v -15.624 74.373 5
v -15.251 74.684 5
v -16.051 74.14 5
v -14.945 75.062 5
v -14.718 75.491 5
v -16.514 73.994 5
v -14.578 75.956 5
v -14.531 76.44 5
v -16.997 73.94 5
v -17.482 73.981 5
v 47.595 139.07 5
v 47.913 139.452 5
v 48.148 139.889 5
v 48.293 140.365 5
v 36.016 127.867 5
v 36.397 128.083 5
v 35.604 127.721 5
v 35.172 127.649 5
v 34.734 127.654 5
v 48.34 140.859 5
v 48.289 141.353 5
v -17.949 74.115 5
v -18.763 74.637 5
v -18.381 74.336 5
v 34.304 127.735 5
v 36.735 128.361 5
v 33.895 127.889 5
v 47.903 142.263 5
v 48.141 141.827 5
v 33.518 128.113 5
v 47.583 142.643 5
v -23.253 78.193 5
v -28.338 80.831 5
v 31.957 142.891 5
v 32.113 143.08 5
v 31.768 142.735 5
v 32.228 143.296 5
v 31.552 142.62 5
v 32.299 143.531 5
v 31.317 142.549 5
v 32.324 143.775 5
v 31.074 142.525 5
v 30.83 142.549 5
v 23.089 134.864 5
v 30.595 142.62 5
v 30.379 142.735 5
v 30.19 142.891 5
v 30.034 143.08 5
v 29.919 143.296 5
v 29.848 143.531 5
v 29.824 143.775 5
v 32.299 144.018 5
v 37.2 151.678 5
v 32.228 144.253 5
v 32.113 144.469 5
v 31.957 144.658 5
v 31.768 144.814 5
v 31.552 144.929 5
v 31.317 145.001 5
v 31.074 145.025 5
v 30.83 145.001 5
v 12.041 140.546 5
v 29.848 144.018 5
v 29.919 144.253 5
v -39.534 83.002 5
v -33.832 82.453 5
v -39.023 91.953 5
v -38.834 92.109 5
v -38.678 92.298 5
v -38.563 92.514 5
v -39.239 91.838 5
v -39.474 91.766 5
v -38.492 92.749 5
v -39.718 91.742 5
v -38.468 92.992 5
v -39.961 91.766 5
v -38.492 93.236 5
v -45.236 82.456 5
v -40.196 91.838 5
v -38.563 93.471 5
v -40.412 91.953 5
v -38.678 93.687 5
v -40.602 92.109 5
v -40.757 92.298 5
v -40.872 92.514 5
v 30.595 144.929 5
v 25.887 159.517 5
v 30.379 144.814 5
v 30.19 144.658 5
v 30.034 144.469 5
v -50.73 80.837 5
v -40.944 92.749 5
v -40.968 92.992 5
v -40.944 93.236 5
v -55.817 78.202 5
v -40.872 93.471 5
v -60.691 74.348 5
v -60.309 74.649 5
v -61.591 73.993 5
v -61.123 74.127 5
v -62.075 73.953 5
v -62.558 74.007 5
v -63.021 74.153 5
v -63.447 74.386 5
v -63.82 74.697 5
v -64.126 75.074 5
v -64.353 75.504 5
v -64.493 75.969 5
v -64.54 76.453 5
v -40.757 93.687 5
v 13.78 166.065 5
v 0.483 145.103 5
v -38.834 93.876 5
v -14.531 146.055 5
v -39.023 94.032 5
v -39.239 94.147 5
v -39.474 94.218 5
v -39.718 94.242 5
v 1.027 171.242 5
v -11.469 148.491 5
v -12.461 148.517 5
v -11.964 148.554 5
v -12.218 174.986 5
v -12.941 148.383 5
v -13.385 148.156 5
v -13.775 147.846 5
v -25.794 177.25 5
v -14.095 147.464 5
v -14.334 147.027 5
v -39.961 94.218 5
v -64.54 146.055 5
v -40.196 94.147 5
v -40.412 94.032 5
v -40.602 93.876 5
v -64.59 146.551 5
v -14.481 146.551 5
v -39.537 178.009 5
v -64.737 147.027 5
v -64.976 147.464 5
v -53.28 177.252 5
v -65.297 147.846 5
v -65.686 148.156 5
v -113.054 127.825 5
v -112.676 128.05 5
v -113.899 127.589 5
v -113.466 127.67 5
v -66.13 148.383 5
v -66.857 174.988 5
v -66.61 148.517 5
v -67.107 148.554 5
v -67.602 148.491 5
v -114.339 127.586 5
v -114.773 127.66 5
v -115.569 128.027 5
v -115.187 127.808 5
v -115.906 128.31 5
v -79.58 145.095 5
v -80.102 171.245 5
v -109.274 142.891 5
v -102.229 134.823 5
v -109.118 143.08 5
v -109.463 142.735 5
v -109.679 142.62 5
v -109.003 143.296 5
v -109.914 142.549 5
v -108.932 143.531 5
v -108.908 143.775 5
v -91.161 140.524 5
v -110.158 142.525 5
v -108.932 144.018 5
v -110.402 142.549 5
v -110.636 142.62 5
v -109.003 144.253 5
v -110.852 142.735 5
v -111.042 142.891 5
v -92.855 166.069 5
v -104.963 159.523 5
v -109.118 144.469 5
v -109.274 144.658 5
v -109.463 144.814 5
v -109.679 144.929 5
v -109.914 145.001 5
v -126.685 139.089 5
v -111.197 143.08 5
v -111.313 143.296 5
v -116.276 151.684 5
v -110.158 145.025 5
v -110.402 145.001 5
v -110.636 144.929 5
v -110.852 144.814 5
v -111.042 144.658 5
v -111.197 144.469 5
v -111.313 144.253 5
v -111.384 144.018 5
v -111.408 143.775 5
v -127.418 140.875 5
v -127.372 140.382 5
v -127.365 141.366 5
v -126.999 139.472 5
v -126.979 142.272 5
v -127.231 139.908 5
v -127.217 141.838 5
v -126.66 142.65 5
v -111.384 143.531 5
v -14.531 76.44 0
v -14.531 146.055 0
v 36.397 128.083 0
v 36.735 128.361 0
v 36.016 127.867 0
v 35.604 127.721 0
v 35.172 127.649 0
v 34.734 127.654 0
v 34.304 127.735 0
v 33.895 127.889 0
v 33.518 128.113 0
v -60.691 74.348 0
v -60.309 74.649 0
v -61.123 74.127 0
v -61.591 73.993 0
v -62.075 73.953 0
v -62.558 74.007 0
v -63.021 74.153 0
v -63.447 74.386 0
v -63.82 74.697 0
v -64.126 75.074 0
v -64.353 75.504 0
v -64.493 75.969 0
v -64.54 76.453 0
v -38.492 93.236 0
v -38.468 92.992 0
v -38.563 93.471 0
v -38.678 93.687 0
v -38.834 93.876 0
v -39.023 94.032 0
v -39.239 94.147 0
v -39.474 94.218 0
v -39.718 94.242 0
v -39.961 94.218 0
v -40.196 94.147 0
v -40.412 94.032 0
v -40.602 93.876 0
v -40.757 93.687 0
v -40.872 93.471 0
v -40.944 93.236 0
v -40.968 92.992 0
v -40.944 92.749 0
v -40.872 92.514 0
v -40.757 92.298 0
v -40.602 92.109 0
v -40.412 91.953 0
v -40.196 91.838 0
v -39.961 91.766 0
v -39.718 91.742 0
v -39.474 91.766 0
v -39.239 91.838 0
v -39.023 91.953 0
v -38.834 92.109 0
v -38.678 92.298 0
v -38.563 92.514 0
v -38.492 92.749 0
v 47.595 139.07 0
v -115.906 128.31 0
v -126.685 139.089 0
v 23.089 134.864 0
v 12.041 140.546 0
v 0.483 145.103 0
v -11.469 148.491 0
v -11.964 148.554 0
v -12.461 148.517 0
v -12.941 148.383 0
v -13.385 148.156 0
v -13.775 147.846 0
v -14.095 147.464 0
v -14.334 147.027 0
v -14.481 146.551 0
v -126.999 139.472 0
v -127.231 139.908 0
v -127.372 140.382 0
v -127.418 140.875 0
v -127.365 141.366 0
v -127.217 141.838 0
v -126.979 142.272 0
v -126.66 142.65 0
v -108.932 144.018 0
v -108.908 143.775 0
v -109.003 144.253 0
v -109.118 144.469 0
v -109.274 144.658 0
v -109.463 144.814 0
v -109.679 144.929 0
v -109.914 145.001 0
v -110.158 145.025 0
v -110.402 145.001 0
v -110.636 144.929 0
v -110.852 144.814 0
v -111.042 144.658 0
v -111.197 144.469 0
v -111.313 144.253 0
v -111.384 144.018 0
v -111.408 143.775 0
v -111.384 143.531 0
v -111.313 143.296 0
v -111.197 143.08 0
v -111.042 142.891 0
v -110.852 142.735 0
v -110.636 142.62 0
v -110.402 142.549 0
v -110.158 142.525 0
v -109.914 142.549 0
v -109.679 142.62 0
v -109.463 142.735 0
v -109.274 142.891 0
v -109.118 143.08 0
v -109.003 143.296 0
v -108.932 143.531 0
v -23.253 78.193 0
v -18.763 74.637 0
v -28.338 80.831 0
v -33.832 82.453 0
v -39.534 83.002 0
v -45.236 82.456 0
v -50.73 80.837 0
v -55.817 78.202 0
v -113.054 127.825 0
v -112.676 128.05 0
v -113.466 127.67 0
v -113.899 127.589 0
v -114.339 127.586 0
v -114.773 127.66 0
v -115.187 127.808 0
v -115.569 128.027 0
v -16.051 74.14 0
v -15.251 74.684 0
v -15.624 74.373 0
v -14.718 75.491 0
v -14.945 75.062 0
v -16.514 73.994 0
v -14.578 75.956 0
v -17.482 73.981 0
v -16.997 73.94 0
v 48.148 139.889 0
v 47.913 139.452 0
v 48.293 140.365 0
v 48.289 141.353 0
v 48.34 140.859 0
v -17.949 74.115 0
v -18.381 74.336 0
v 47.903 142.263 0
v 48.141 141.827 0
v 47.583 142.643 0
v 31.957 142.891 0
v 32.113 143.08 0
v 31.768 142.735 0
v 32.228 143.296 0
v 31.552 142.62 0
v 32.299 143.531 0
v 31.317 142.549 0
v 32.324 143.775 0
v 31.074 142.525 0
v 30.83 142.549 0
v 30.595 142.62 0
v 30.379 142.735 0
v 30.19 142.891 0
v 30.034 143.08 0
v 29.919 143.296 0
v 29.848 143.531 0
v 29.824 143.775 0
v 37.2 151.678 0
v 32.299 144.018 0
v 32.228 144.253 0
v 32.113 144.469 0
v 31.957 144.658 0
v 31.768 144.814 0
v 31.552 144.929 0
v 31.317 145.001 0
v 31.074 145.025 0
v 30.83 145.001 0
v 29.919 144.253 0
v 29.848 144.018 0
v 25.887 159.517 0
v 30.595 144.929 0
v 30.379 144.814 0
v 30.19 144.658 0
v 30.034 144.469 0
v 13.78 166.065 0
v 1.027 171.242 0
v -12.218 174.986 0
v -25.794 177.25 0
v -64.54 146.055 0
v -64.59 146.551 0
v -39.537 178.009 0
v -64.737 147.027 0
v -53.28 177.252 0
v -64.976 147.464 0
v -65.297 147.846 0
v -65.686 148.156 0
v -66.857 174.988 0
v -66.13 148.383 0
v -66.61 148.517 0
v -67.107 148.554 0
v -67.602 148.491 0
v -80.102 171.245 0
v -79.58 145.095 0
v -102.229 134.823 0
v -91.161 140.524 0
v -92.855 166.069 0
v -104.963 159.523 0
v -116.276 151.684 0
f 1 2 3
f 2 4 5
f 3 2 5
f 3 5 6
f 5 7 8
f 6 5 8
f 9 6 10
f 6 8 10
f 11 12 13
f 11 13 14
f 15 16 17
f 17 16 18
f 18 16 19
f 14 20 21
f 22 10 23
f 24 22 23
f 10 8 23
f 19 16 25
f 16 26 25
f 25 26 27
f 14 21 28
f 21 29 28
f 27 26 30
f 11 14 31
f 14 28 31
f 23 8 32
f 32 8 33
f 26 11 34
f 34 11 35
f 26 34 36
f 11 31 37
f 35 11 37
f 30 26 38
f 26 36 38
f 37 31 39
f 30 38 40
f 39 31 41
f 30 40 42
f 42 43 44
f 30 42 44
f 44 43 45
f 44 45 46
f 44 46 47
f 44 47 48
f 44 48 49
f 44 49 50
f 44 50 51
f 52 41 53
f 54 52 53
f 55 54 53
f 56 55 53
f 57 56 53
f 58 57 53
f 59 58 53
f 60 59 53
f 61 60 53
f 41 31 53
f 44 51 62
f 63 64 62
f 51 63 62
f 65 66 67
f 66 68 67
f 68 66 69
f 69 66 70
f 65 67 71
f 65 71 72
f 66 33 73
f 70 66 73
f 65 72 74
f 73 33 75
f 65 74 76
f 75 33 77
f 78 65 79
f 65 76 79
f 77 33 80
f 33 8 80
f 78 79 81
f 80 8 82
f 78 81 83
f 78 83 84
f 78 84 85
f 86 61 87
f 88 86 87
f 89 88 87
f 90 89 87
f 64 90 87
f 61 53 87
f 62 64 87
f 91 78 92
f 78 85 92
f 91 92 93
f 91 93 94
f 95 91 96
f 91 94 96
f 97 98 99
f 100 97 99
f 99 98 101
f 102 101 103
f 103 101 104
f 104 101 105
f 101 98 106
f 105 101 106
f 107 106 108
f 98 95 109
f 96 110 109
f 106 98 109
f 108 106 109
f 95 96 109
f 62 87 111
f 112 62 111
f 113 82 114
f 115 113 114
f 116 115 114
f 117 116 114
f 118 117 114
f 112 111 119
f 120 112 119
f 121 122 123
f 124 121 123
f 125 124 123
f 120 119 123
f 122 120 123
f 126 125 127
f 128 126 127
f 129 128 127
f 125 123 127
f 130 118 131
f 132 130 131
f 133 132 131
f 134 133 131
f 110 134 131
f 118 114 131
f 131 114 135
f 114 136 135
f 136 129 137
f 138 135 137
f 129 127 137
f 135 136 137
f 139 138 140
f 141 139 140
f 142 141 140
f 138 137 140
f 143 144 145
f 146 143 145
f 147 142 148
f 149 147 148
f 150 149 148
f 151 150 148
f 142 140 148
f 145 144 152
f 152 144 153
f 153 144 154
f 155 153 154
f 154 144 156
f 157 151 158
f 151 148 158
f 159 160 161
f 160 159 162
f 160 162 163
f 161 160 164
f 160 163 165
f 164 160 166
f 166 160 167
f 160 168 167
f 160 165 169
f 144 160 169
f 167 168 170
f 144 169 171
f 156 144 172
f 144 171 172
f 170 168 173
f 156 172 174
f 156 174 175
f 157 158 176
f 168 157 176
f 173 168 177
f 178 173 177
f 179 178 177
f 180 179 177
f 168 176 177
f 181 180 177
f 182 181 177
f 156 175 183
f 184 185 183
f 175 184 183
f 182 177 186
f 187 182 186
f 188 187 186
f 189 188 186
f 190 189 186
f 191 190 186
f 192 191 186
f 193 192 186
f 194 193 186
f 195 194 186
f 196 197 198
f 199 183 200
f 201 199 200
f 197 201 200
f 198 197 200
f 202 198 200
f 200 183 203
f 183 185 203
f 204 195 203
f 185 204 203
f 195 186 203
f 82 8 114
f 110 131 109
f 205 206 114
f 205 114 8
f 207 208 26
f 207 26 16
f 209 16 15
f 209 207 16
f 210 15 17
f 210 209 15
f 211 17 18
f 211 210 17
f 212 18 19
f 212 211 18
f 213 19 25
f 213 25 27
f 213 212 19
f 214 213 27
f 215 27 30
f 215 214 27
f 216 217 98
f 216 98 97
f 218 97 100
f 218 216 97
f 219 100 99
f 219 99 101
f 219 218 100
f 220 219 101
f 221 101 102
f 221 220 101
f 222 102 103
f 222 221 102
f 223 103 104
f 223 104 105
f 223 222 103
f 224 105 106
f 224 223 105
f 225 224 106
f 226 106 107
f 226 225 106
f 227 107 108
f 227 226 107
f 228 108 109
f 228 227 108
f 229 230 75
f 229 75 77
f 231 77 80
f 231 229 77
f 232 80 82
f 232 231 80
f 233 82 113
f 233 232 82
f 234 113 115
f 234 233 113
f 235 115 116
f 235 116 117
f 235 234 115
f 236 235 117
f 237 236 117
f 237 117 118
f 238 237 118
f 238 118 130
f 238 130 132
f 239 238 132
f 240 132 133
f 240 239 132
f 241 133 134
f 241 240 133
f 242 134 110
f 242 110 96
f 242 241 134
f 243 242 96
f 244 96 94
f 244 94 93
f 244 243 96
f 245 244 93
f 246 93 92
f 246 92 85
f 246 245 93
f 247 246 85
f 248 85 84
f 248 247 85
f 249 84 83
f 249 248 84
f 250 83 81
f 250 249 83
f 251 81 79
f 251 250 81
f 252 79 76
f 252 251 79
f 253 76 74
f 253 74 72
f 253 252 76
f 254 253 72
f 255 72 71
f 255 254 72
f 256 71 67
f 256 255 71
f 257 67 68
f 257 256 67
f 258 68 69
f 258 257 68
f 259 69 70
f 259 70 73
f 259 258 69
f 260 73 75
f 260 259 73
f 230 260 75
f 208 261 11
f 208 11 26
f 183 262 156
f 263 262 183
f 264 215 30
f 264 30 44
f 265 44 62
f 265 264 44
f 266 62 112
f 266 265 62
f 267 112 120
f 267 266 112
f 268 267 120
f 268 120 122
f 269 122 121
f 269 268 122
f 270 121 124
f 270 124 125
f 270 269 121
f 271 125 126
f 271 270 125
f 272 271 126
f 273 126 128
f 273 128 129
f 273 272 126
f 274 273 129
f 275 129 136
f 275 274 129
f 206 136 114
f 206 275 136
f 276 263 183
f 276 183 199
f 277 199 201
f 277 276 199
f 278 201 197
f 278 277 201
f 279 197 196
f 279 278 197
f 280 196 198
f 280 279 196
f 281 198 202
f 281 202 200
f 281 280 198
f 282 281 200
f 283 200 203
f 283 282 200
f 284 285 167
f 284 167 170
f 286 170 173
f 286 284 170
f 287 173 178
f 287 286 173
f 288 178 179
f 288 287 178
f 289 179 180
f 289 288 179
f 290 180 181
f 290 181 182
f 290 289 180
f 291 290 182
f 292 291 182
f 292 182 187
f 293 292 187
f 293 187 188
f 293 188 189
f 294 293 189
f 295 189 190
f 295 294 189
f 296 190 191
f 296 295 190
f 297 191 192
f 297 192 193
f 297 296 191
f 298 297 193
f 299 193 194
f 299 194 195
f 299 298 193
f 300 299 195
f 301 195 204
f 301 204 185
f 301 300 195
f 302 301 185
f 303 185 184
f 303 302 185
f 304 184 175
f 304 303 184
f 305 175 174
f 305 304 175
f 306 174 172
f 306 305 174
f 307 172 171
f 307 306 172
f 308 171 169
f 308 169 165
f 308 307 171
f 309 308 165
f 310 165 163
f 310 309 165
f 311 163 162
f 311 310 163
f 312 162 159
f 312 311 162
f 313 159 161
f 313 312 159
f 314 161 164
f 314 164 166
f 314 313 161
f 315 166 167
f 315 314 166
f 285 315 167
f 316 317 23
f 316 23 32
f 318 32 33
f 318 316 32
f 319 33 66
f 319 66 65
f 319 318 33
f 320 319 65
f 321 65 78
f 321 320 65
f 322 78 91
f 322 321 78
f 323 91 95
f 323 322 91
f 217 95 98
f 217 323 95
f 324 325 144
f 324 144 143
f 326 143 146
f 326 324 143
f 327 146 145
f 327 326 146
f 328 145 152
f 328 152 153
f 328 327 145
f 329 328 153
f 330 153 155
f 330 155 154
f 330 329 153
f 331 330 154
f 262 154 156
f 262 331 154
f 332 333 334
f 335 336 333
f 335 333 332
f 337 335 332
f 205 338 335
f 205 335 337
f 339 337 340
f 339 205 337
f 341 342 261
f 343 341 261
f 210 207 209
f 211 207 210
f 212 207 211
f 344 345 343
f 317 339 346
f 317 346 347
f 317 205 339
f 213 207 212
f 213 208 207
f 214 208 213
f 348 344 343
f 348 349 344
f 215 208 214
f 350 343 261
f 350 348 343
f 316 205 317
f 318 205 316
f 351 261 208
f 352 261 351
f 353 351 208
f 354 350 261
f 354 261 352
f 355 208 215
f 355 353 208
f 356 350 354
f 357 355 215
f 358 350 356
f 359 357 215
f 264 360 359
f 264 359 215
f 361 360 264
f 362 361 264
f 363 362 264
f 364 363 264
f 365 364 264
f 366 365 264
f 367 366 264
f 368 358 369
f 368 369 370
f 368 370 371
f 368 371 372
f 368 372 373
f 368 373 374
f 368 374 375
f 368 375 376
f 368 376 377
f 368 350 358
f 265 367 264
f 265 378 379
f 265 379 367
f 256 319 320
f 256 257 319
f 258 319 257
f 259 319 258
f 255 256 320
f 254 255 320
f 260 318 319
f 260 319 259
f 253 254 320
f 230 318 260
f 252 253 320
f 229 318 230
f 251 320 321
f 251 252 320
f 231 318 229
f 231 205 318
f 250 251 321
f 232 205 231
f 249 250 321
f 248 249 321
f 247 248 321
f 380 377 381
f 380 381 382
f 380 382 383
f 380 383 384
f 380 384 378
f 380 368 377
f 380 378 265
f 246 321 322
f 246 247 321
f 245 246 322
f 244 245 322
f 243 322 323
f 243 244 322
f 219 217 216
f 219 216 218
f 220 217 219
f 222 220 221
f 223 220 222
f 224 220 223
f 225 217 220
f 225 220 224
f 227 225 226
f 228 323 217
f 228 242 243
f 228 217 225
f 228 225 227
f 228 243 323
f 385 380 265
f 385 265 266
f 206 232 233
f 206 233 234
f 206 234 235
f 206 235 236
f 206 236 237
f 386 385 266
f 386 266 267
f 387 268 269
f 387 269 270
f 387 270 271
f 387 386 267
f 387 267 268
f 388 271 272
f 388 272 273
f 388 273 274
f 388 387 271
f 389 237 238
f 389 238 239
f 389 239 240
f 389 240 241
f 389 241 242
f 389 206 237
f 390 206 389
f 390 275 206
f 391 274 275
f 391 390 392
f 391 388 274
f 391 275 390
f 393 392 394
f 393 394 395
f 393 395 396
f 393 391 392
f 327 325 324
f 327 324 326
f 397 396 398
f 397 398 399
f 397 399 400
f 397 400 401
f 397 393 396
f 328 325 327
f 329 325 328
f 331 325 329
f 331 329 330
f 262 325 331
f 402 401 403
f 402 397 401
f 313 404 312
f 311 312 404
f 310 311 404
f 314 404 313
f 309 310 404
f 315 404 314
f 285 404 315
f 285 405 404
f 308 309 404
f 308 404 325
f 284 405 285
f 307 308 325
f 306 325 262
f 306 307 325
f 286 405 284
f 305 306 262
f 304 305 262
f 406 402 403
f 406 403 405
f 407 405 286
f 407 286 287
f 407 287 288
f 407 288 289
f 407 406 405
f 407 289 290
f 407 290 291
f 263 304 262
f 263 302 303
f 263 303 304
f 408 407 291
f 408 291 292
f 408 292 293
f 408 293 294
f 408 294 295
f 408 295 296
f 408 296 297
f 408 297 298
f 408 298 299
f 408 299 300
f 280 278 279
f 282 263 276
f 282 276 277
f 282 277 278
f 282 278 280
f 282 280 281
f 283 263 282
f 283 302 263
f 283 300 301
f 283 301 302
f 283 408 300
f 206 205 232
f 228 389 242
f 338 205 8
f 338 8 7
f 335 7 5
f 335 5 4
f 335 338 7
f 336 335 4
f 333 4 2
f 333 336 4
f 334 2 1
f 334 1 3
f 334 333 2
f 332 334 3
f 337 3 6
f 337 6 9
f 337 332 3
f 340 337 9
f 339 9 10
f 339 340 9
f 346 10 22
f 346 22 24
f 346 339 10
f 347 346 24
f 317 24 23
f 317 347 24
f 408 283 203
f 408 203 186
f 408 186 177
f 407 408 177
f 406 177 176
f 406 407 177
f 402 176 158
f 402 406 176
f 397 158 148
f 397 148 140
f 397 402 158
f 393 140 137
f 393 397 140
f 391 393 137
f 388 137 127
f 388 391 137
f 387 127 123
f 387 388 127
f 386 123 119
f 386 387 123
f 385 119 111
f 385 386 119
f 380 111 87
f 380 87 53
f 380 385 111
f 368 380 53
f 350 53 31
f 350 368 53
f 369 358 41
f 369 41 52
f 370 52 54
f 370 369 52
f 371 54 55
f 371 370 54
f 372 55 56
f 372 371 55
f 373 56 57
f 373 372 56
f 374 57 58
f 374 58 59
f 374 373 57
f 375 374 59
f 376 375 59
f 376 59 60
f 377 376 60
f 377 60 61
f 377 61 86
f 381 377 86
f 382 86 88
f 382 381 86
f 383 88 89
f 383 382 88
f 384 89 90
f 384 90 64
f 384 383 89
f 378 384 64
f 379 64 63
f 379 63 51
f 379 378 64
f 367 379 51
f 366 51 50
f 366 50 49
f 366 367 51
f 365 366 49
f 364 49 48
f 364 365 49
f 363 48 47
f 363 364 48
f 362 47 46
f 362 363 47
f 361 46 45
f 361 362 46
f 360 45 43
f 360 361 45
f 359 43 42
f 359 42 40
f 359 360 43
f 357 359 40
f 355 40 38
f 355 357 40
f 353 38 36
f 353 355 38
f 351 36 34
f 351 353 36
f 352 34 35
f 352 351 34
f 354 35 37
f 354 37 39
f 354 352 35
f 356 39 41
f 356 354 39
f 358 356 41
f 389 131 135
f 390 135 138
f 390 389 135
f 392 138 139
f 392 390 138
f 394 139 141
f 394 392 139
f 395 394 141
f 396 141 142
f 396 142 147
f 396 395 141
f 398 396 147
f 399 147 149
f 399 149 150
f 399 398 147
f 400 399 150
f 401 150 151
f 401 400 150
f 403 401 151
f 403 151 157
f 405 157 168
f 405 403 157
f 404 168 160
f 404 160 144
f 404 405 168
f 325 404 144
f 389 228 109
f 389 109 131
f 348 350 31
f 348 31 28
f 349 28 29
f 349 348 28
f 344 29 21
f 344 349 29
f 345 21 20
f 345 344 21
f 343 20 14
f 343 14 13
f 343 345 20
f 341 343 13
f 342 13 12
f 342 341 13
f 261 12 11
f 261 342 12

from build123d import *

# Parameters (mm, degrees)
SKETCH1_R           = 1.25
BOSS_EXTRUDE1_DEPTH = 5


with BuildPart() as part:
    # Sketch1 → Boss-Extrude1 (new body)
    with BuildSketch(Plane.XY):
        with BuildLine():
            Line((-14.530655618, 76.440036381), (-14.530655618, 146.054710198))
            ThreePointArc((-14.530655618, 146.054710198), (-13.587367163, 148.010892491), (-11.469336287, 148.490879447))
            ThreePointArc((-11.469336287, 148.490879447), (12.04095694, 140.545885375), (33.518380328, 128.112981328))
            ThreePointArc((33.518380328, 128.112981328), (35.171966674, 127.649015862), (36.734698992, 128.361391788))
            Line((36.734698992, 128.361391788), (47.595476063, 139.069916571))
            ThreePointArc((47.595476063, 139.069916571), (48.340215149, 140.859037128), (47.582728327, 142.642797871))
            ThreePointArc((47.582728327, 142.642797871), (-39.537255282, 178.008774119), (-126.659999819, 142.649599861))
            ThreePointArc((-126.659999819, 142.649599861), (-127.417578865, 140.874623829), (-126.685409475, 139.089016395))
            Line((-126.685409475, 139.089016395), (-115.90638117, 128.309988089))
            ThreePointArc((-115.90638117, 128.309988089), (-114.338855979, 127.585787298), (-112.675804189, 128.050395473))
            ThreePointArc((-112.675804189, 128.050395473), (-91.160542777, 140.523686318), (-67.601782697, 148.490761164))
            ThreePointArc((-67.601782697, 148.490761164), (-65.483745675, 148.010779854), (-64.540453099, 146.054594281))
            Line((-64.540453099, 146.054594281), (-64.540453099, 76.452673847))
            ThreePointArc((-64.540453099, 76.452673847), (-63.02087634, 74.152941195), (-60.309436884, 74.648904776))
            ThreePointArc((-60.309436884, 74.648904776), (-39.533713803, 83.001706864), (-18.762684454, 74.637239634))
            ThreePointArc((-18.762684454, 74.637239634), (-16.050878115, 74.140028546), (-14.530655618, 76.440036381))
        make_face()
        with Locations((-39.71763232, 92.992417004)):
            Circle(SKETCH1_R, mode=Mode.SUBTRACT)
        with Locations((-110.157771622, 143.774581978)):
            Circle(SKETCH1_R, mode=Mode.SUBTRACT)
        with Locations((31.073501699, 143.774581978)):
            Circle(SKETCH1_R, mode=Mode.SUBTRACT)
    extrude(amount=BOSS_EXTRUDE1_DEPTH)


solid = part.part
